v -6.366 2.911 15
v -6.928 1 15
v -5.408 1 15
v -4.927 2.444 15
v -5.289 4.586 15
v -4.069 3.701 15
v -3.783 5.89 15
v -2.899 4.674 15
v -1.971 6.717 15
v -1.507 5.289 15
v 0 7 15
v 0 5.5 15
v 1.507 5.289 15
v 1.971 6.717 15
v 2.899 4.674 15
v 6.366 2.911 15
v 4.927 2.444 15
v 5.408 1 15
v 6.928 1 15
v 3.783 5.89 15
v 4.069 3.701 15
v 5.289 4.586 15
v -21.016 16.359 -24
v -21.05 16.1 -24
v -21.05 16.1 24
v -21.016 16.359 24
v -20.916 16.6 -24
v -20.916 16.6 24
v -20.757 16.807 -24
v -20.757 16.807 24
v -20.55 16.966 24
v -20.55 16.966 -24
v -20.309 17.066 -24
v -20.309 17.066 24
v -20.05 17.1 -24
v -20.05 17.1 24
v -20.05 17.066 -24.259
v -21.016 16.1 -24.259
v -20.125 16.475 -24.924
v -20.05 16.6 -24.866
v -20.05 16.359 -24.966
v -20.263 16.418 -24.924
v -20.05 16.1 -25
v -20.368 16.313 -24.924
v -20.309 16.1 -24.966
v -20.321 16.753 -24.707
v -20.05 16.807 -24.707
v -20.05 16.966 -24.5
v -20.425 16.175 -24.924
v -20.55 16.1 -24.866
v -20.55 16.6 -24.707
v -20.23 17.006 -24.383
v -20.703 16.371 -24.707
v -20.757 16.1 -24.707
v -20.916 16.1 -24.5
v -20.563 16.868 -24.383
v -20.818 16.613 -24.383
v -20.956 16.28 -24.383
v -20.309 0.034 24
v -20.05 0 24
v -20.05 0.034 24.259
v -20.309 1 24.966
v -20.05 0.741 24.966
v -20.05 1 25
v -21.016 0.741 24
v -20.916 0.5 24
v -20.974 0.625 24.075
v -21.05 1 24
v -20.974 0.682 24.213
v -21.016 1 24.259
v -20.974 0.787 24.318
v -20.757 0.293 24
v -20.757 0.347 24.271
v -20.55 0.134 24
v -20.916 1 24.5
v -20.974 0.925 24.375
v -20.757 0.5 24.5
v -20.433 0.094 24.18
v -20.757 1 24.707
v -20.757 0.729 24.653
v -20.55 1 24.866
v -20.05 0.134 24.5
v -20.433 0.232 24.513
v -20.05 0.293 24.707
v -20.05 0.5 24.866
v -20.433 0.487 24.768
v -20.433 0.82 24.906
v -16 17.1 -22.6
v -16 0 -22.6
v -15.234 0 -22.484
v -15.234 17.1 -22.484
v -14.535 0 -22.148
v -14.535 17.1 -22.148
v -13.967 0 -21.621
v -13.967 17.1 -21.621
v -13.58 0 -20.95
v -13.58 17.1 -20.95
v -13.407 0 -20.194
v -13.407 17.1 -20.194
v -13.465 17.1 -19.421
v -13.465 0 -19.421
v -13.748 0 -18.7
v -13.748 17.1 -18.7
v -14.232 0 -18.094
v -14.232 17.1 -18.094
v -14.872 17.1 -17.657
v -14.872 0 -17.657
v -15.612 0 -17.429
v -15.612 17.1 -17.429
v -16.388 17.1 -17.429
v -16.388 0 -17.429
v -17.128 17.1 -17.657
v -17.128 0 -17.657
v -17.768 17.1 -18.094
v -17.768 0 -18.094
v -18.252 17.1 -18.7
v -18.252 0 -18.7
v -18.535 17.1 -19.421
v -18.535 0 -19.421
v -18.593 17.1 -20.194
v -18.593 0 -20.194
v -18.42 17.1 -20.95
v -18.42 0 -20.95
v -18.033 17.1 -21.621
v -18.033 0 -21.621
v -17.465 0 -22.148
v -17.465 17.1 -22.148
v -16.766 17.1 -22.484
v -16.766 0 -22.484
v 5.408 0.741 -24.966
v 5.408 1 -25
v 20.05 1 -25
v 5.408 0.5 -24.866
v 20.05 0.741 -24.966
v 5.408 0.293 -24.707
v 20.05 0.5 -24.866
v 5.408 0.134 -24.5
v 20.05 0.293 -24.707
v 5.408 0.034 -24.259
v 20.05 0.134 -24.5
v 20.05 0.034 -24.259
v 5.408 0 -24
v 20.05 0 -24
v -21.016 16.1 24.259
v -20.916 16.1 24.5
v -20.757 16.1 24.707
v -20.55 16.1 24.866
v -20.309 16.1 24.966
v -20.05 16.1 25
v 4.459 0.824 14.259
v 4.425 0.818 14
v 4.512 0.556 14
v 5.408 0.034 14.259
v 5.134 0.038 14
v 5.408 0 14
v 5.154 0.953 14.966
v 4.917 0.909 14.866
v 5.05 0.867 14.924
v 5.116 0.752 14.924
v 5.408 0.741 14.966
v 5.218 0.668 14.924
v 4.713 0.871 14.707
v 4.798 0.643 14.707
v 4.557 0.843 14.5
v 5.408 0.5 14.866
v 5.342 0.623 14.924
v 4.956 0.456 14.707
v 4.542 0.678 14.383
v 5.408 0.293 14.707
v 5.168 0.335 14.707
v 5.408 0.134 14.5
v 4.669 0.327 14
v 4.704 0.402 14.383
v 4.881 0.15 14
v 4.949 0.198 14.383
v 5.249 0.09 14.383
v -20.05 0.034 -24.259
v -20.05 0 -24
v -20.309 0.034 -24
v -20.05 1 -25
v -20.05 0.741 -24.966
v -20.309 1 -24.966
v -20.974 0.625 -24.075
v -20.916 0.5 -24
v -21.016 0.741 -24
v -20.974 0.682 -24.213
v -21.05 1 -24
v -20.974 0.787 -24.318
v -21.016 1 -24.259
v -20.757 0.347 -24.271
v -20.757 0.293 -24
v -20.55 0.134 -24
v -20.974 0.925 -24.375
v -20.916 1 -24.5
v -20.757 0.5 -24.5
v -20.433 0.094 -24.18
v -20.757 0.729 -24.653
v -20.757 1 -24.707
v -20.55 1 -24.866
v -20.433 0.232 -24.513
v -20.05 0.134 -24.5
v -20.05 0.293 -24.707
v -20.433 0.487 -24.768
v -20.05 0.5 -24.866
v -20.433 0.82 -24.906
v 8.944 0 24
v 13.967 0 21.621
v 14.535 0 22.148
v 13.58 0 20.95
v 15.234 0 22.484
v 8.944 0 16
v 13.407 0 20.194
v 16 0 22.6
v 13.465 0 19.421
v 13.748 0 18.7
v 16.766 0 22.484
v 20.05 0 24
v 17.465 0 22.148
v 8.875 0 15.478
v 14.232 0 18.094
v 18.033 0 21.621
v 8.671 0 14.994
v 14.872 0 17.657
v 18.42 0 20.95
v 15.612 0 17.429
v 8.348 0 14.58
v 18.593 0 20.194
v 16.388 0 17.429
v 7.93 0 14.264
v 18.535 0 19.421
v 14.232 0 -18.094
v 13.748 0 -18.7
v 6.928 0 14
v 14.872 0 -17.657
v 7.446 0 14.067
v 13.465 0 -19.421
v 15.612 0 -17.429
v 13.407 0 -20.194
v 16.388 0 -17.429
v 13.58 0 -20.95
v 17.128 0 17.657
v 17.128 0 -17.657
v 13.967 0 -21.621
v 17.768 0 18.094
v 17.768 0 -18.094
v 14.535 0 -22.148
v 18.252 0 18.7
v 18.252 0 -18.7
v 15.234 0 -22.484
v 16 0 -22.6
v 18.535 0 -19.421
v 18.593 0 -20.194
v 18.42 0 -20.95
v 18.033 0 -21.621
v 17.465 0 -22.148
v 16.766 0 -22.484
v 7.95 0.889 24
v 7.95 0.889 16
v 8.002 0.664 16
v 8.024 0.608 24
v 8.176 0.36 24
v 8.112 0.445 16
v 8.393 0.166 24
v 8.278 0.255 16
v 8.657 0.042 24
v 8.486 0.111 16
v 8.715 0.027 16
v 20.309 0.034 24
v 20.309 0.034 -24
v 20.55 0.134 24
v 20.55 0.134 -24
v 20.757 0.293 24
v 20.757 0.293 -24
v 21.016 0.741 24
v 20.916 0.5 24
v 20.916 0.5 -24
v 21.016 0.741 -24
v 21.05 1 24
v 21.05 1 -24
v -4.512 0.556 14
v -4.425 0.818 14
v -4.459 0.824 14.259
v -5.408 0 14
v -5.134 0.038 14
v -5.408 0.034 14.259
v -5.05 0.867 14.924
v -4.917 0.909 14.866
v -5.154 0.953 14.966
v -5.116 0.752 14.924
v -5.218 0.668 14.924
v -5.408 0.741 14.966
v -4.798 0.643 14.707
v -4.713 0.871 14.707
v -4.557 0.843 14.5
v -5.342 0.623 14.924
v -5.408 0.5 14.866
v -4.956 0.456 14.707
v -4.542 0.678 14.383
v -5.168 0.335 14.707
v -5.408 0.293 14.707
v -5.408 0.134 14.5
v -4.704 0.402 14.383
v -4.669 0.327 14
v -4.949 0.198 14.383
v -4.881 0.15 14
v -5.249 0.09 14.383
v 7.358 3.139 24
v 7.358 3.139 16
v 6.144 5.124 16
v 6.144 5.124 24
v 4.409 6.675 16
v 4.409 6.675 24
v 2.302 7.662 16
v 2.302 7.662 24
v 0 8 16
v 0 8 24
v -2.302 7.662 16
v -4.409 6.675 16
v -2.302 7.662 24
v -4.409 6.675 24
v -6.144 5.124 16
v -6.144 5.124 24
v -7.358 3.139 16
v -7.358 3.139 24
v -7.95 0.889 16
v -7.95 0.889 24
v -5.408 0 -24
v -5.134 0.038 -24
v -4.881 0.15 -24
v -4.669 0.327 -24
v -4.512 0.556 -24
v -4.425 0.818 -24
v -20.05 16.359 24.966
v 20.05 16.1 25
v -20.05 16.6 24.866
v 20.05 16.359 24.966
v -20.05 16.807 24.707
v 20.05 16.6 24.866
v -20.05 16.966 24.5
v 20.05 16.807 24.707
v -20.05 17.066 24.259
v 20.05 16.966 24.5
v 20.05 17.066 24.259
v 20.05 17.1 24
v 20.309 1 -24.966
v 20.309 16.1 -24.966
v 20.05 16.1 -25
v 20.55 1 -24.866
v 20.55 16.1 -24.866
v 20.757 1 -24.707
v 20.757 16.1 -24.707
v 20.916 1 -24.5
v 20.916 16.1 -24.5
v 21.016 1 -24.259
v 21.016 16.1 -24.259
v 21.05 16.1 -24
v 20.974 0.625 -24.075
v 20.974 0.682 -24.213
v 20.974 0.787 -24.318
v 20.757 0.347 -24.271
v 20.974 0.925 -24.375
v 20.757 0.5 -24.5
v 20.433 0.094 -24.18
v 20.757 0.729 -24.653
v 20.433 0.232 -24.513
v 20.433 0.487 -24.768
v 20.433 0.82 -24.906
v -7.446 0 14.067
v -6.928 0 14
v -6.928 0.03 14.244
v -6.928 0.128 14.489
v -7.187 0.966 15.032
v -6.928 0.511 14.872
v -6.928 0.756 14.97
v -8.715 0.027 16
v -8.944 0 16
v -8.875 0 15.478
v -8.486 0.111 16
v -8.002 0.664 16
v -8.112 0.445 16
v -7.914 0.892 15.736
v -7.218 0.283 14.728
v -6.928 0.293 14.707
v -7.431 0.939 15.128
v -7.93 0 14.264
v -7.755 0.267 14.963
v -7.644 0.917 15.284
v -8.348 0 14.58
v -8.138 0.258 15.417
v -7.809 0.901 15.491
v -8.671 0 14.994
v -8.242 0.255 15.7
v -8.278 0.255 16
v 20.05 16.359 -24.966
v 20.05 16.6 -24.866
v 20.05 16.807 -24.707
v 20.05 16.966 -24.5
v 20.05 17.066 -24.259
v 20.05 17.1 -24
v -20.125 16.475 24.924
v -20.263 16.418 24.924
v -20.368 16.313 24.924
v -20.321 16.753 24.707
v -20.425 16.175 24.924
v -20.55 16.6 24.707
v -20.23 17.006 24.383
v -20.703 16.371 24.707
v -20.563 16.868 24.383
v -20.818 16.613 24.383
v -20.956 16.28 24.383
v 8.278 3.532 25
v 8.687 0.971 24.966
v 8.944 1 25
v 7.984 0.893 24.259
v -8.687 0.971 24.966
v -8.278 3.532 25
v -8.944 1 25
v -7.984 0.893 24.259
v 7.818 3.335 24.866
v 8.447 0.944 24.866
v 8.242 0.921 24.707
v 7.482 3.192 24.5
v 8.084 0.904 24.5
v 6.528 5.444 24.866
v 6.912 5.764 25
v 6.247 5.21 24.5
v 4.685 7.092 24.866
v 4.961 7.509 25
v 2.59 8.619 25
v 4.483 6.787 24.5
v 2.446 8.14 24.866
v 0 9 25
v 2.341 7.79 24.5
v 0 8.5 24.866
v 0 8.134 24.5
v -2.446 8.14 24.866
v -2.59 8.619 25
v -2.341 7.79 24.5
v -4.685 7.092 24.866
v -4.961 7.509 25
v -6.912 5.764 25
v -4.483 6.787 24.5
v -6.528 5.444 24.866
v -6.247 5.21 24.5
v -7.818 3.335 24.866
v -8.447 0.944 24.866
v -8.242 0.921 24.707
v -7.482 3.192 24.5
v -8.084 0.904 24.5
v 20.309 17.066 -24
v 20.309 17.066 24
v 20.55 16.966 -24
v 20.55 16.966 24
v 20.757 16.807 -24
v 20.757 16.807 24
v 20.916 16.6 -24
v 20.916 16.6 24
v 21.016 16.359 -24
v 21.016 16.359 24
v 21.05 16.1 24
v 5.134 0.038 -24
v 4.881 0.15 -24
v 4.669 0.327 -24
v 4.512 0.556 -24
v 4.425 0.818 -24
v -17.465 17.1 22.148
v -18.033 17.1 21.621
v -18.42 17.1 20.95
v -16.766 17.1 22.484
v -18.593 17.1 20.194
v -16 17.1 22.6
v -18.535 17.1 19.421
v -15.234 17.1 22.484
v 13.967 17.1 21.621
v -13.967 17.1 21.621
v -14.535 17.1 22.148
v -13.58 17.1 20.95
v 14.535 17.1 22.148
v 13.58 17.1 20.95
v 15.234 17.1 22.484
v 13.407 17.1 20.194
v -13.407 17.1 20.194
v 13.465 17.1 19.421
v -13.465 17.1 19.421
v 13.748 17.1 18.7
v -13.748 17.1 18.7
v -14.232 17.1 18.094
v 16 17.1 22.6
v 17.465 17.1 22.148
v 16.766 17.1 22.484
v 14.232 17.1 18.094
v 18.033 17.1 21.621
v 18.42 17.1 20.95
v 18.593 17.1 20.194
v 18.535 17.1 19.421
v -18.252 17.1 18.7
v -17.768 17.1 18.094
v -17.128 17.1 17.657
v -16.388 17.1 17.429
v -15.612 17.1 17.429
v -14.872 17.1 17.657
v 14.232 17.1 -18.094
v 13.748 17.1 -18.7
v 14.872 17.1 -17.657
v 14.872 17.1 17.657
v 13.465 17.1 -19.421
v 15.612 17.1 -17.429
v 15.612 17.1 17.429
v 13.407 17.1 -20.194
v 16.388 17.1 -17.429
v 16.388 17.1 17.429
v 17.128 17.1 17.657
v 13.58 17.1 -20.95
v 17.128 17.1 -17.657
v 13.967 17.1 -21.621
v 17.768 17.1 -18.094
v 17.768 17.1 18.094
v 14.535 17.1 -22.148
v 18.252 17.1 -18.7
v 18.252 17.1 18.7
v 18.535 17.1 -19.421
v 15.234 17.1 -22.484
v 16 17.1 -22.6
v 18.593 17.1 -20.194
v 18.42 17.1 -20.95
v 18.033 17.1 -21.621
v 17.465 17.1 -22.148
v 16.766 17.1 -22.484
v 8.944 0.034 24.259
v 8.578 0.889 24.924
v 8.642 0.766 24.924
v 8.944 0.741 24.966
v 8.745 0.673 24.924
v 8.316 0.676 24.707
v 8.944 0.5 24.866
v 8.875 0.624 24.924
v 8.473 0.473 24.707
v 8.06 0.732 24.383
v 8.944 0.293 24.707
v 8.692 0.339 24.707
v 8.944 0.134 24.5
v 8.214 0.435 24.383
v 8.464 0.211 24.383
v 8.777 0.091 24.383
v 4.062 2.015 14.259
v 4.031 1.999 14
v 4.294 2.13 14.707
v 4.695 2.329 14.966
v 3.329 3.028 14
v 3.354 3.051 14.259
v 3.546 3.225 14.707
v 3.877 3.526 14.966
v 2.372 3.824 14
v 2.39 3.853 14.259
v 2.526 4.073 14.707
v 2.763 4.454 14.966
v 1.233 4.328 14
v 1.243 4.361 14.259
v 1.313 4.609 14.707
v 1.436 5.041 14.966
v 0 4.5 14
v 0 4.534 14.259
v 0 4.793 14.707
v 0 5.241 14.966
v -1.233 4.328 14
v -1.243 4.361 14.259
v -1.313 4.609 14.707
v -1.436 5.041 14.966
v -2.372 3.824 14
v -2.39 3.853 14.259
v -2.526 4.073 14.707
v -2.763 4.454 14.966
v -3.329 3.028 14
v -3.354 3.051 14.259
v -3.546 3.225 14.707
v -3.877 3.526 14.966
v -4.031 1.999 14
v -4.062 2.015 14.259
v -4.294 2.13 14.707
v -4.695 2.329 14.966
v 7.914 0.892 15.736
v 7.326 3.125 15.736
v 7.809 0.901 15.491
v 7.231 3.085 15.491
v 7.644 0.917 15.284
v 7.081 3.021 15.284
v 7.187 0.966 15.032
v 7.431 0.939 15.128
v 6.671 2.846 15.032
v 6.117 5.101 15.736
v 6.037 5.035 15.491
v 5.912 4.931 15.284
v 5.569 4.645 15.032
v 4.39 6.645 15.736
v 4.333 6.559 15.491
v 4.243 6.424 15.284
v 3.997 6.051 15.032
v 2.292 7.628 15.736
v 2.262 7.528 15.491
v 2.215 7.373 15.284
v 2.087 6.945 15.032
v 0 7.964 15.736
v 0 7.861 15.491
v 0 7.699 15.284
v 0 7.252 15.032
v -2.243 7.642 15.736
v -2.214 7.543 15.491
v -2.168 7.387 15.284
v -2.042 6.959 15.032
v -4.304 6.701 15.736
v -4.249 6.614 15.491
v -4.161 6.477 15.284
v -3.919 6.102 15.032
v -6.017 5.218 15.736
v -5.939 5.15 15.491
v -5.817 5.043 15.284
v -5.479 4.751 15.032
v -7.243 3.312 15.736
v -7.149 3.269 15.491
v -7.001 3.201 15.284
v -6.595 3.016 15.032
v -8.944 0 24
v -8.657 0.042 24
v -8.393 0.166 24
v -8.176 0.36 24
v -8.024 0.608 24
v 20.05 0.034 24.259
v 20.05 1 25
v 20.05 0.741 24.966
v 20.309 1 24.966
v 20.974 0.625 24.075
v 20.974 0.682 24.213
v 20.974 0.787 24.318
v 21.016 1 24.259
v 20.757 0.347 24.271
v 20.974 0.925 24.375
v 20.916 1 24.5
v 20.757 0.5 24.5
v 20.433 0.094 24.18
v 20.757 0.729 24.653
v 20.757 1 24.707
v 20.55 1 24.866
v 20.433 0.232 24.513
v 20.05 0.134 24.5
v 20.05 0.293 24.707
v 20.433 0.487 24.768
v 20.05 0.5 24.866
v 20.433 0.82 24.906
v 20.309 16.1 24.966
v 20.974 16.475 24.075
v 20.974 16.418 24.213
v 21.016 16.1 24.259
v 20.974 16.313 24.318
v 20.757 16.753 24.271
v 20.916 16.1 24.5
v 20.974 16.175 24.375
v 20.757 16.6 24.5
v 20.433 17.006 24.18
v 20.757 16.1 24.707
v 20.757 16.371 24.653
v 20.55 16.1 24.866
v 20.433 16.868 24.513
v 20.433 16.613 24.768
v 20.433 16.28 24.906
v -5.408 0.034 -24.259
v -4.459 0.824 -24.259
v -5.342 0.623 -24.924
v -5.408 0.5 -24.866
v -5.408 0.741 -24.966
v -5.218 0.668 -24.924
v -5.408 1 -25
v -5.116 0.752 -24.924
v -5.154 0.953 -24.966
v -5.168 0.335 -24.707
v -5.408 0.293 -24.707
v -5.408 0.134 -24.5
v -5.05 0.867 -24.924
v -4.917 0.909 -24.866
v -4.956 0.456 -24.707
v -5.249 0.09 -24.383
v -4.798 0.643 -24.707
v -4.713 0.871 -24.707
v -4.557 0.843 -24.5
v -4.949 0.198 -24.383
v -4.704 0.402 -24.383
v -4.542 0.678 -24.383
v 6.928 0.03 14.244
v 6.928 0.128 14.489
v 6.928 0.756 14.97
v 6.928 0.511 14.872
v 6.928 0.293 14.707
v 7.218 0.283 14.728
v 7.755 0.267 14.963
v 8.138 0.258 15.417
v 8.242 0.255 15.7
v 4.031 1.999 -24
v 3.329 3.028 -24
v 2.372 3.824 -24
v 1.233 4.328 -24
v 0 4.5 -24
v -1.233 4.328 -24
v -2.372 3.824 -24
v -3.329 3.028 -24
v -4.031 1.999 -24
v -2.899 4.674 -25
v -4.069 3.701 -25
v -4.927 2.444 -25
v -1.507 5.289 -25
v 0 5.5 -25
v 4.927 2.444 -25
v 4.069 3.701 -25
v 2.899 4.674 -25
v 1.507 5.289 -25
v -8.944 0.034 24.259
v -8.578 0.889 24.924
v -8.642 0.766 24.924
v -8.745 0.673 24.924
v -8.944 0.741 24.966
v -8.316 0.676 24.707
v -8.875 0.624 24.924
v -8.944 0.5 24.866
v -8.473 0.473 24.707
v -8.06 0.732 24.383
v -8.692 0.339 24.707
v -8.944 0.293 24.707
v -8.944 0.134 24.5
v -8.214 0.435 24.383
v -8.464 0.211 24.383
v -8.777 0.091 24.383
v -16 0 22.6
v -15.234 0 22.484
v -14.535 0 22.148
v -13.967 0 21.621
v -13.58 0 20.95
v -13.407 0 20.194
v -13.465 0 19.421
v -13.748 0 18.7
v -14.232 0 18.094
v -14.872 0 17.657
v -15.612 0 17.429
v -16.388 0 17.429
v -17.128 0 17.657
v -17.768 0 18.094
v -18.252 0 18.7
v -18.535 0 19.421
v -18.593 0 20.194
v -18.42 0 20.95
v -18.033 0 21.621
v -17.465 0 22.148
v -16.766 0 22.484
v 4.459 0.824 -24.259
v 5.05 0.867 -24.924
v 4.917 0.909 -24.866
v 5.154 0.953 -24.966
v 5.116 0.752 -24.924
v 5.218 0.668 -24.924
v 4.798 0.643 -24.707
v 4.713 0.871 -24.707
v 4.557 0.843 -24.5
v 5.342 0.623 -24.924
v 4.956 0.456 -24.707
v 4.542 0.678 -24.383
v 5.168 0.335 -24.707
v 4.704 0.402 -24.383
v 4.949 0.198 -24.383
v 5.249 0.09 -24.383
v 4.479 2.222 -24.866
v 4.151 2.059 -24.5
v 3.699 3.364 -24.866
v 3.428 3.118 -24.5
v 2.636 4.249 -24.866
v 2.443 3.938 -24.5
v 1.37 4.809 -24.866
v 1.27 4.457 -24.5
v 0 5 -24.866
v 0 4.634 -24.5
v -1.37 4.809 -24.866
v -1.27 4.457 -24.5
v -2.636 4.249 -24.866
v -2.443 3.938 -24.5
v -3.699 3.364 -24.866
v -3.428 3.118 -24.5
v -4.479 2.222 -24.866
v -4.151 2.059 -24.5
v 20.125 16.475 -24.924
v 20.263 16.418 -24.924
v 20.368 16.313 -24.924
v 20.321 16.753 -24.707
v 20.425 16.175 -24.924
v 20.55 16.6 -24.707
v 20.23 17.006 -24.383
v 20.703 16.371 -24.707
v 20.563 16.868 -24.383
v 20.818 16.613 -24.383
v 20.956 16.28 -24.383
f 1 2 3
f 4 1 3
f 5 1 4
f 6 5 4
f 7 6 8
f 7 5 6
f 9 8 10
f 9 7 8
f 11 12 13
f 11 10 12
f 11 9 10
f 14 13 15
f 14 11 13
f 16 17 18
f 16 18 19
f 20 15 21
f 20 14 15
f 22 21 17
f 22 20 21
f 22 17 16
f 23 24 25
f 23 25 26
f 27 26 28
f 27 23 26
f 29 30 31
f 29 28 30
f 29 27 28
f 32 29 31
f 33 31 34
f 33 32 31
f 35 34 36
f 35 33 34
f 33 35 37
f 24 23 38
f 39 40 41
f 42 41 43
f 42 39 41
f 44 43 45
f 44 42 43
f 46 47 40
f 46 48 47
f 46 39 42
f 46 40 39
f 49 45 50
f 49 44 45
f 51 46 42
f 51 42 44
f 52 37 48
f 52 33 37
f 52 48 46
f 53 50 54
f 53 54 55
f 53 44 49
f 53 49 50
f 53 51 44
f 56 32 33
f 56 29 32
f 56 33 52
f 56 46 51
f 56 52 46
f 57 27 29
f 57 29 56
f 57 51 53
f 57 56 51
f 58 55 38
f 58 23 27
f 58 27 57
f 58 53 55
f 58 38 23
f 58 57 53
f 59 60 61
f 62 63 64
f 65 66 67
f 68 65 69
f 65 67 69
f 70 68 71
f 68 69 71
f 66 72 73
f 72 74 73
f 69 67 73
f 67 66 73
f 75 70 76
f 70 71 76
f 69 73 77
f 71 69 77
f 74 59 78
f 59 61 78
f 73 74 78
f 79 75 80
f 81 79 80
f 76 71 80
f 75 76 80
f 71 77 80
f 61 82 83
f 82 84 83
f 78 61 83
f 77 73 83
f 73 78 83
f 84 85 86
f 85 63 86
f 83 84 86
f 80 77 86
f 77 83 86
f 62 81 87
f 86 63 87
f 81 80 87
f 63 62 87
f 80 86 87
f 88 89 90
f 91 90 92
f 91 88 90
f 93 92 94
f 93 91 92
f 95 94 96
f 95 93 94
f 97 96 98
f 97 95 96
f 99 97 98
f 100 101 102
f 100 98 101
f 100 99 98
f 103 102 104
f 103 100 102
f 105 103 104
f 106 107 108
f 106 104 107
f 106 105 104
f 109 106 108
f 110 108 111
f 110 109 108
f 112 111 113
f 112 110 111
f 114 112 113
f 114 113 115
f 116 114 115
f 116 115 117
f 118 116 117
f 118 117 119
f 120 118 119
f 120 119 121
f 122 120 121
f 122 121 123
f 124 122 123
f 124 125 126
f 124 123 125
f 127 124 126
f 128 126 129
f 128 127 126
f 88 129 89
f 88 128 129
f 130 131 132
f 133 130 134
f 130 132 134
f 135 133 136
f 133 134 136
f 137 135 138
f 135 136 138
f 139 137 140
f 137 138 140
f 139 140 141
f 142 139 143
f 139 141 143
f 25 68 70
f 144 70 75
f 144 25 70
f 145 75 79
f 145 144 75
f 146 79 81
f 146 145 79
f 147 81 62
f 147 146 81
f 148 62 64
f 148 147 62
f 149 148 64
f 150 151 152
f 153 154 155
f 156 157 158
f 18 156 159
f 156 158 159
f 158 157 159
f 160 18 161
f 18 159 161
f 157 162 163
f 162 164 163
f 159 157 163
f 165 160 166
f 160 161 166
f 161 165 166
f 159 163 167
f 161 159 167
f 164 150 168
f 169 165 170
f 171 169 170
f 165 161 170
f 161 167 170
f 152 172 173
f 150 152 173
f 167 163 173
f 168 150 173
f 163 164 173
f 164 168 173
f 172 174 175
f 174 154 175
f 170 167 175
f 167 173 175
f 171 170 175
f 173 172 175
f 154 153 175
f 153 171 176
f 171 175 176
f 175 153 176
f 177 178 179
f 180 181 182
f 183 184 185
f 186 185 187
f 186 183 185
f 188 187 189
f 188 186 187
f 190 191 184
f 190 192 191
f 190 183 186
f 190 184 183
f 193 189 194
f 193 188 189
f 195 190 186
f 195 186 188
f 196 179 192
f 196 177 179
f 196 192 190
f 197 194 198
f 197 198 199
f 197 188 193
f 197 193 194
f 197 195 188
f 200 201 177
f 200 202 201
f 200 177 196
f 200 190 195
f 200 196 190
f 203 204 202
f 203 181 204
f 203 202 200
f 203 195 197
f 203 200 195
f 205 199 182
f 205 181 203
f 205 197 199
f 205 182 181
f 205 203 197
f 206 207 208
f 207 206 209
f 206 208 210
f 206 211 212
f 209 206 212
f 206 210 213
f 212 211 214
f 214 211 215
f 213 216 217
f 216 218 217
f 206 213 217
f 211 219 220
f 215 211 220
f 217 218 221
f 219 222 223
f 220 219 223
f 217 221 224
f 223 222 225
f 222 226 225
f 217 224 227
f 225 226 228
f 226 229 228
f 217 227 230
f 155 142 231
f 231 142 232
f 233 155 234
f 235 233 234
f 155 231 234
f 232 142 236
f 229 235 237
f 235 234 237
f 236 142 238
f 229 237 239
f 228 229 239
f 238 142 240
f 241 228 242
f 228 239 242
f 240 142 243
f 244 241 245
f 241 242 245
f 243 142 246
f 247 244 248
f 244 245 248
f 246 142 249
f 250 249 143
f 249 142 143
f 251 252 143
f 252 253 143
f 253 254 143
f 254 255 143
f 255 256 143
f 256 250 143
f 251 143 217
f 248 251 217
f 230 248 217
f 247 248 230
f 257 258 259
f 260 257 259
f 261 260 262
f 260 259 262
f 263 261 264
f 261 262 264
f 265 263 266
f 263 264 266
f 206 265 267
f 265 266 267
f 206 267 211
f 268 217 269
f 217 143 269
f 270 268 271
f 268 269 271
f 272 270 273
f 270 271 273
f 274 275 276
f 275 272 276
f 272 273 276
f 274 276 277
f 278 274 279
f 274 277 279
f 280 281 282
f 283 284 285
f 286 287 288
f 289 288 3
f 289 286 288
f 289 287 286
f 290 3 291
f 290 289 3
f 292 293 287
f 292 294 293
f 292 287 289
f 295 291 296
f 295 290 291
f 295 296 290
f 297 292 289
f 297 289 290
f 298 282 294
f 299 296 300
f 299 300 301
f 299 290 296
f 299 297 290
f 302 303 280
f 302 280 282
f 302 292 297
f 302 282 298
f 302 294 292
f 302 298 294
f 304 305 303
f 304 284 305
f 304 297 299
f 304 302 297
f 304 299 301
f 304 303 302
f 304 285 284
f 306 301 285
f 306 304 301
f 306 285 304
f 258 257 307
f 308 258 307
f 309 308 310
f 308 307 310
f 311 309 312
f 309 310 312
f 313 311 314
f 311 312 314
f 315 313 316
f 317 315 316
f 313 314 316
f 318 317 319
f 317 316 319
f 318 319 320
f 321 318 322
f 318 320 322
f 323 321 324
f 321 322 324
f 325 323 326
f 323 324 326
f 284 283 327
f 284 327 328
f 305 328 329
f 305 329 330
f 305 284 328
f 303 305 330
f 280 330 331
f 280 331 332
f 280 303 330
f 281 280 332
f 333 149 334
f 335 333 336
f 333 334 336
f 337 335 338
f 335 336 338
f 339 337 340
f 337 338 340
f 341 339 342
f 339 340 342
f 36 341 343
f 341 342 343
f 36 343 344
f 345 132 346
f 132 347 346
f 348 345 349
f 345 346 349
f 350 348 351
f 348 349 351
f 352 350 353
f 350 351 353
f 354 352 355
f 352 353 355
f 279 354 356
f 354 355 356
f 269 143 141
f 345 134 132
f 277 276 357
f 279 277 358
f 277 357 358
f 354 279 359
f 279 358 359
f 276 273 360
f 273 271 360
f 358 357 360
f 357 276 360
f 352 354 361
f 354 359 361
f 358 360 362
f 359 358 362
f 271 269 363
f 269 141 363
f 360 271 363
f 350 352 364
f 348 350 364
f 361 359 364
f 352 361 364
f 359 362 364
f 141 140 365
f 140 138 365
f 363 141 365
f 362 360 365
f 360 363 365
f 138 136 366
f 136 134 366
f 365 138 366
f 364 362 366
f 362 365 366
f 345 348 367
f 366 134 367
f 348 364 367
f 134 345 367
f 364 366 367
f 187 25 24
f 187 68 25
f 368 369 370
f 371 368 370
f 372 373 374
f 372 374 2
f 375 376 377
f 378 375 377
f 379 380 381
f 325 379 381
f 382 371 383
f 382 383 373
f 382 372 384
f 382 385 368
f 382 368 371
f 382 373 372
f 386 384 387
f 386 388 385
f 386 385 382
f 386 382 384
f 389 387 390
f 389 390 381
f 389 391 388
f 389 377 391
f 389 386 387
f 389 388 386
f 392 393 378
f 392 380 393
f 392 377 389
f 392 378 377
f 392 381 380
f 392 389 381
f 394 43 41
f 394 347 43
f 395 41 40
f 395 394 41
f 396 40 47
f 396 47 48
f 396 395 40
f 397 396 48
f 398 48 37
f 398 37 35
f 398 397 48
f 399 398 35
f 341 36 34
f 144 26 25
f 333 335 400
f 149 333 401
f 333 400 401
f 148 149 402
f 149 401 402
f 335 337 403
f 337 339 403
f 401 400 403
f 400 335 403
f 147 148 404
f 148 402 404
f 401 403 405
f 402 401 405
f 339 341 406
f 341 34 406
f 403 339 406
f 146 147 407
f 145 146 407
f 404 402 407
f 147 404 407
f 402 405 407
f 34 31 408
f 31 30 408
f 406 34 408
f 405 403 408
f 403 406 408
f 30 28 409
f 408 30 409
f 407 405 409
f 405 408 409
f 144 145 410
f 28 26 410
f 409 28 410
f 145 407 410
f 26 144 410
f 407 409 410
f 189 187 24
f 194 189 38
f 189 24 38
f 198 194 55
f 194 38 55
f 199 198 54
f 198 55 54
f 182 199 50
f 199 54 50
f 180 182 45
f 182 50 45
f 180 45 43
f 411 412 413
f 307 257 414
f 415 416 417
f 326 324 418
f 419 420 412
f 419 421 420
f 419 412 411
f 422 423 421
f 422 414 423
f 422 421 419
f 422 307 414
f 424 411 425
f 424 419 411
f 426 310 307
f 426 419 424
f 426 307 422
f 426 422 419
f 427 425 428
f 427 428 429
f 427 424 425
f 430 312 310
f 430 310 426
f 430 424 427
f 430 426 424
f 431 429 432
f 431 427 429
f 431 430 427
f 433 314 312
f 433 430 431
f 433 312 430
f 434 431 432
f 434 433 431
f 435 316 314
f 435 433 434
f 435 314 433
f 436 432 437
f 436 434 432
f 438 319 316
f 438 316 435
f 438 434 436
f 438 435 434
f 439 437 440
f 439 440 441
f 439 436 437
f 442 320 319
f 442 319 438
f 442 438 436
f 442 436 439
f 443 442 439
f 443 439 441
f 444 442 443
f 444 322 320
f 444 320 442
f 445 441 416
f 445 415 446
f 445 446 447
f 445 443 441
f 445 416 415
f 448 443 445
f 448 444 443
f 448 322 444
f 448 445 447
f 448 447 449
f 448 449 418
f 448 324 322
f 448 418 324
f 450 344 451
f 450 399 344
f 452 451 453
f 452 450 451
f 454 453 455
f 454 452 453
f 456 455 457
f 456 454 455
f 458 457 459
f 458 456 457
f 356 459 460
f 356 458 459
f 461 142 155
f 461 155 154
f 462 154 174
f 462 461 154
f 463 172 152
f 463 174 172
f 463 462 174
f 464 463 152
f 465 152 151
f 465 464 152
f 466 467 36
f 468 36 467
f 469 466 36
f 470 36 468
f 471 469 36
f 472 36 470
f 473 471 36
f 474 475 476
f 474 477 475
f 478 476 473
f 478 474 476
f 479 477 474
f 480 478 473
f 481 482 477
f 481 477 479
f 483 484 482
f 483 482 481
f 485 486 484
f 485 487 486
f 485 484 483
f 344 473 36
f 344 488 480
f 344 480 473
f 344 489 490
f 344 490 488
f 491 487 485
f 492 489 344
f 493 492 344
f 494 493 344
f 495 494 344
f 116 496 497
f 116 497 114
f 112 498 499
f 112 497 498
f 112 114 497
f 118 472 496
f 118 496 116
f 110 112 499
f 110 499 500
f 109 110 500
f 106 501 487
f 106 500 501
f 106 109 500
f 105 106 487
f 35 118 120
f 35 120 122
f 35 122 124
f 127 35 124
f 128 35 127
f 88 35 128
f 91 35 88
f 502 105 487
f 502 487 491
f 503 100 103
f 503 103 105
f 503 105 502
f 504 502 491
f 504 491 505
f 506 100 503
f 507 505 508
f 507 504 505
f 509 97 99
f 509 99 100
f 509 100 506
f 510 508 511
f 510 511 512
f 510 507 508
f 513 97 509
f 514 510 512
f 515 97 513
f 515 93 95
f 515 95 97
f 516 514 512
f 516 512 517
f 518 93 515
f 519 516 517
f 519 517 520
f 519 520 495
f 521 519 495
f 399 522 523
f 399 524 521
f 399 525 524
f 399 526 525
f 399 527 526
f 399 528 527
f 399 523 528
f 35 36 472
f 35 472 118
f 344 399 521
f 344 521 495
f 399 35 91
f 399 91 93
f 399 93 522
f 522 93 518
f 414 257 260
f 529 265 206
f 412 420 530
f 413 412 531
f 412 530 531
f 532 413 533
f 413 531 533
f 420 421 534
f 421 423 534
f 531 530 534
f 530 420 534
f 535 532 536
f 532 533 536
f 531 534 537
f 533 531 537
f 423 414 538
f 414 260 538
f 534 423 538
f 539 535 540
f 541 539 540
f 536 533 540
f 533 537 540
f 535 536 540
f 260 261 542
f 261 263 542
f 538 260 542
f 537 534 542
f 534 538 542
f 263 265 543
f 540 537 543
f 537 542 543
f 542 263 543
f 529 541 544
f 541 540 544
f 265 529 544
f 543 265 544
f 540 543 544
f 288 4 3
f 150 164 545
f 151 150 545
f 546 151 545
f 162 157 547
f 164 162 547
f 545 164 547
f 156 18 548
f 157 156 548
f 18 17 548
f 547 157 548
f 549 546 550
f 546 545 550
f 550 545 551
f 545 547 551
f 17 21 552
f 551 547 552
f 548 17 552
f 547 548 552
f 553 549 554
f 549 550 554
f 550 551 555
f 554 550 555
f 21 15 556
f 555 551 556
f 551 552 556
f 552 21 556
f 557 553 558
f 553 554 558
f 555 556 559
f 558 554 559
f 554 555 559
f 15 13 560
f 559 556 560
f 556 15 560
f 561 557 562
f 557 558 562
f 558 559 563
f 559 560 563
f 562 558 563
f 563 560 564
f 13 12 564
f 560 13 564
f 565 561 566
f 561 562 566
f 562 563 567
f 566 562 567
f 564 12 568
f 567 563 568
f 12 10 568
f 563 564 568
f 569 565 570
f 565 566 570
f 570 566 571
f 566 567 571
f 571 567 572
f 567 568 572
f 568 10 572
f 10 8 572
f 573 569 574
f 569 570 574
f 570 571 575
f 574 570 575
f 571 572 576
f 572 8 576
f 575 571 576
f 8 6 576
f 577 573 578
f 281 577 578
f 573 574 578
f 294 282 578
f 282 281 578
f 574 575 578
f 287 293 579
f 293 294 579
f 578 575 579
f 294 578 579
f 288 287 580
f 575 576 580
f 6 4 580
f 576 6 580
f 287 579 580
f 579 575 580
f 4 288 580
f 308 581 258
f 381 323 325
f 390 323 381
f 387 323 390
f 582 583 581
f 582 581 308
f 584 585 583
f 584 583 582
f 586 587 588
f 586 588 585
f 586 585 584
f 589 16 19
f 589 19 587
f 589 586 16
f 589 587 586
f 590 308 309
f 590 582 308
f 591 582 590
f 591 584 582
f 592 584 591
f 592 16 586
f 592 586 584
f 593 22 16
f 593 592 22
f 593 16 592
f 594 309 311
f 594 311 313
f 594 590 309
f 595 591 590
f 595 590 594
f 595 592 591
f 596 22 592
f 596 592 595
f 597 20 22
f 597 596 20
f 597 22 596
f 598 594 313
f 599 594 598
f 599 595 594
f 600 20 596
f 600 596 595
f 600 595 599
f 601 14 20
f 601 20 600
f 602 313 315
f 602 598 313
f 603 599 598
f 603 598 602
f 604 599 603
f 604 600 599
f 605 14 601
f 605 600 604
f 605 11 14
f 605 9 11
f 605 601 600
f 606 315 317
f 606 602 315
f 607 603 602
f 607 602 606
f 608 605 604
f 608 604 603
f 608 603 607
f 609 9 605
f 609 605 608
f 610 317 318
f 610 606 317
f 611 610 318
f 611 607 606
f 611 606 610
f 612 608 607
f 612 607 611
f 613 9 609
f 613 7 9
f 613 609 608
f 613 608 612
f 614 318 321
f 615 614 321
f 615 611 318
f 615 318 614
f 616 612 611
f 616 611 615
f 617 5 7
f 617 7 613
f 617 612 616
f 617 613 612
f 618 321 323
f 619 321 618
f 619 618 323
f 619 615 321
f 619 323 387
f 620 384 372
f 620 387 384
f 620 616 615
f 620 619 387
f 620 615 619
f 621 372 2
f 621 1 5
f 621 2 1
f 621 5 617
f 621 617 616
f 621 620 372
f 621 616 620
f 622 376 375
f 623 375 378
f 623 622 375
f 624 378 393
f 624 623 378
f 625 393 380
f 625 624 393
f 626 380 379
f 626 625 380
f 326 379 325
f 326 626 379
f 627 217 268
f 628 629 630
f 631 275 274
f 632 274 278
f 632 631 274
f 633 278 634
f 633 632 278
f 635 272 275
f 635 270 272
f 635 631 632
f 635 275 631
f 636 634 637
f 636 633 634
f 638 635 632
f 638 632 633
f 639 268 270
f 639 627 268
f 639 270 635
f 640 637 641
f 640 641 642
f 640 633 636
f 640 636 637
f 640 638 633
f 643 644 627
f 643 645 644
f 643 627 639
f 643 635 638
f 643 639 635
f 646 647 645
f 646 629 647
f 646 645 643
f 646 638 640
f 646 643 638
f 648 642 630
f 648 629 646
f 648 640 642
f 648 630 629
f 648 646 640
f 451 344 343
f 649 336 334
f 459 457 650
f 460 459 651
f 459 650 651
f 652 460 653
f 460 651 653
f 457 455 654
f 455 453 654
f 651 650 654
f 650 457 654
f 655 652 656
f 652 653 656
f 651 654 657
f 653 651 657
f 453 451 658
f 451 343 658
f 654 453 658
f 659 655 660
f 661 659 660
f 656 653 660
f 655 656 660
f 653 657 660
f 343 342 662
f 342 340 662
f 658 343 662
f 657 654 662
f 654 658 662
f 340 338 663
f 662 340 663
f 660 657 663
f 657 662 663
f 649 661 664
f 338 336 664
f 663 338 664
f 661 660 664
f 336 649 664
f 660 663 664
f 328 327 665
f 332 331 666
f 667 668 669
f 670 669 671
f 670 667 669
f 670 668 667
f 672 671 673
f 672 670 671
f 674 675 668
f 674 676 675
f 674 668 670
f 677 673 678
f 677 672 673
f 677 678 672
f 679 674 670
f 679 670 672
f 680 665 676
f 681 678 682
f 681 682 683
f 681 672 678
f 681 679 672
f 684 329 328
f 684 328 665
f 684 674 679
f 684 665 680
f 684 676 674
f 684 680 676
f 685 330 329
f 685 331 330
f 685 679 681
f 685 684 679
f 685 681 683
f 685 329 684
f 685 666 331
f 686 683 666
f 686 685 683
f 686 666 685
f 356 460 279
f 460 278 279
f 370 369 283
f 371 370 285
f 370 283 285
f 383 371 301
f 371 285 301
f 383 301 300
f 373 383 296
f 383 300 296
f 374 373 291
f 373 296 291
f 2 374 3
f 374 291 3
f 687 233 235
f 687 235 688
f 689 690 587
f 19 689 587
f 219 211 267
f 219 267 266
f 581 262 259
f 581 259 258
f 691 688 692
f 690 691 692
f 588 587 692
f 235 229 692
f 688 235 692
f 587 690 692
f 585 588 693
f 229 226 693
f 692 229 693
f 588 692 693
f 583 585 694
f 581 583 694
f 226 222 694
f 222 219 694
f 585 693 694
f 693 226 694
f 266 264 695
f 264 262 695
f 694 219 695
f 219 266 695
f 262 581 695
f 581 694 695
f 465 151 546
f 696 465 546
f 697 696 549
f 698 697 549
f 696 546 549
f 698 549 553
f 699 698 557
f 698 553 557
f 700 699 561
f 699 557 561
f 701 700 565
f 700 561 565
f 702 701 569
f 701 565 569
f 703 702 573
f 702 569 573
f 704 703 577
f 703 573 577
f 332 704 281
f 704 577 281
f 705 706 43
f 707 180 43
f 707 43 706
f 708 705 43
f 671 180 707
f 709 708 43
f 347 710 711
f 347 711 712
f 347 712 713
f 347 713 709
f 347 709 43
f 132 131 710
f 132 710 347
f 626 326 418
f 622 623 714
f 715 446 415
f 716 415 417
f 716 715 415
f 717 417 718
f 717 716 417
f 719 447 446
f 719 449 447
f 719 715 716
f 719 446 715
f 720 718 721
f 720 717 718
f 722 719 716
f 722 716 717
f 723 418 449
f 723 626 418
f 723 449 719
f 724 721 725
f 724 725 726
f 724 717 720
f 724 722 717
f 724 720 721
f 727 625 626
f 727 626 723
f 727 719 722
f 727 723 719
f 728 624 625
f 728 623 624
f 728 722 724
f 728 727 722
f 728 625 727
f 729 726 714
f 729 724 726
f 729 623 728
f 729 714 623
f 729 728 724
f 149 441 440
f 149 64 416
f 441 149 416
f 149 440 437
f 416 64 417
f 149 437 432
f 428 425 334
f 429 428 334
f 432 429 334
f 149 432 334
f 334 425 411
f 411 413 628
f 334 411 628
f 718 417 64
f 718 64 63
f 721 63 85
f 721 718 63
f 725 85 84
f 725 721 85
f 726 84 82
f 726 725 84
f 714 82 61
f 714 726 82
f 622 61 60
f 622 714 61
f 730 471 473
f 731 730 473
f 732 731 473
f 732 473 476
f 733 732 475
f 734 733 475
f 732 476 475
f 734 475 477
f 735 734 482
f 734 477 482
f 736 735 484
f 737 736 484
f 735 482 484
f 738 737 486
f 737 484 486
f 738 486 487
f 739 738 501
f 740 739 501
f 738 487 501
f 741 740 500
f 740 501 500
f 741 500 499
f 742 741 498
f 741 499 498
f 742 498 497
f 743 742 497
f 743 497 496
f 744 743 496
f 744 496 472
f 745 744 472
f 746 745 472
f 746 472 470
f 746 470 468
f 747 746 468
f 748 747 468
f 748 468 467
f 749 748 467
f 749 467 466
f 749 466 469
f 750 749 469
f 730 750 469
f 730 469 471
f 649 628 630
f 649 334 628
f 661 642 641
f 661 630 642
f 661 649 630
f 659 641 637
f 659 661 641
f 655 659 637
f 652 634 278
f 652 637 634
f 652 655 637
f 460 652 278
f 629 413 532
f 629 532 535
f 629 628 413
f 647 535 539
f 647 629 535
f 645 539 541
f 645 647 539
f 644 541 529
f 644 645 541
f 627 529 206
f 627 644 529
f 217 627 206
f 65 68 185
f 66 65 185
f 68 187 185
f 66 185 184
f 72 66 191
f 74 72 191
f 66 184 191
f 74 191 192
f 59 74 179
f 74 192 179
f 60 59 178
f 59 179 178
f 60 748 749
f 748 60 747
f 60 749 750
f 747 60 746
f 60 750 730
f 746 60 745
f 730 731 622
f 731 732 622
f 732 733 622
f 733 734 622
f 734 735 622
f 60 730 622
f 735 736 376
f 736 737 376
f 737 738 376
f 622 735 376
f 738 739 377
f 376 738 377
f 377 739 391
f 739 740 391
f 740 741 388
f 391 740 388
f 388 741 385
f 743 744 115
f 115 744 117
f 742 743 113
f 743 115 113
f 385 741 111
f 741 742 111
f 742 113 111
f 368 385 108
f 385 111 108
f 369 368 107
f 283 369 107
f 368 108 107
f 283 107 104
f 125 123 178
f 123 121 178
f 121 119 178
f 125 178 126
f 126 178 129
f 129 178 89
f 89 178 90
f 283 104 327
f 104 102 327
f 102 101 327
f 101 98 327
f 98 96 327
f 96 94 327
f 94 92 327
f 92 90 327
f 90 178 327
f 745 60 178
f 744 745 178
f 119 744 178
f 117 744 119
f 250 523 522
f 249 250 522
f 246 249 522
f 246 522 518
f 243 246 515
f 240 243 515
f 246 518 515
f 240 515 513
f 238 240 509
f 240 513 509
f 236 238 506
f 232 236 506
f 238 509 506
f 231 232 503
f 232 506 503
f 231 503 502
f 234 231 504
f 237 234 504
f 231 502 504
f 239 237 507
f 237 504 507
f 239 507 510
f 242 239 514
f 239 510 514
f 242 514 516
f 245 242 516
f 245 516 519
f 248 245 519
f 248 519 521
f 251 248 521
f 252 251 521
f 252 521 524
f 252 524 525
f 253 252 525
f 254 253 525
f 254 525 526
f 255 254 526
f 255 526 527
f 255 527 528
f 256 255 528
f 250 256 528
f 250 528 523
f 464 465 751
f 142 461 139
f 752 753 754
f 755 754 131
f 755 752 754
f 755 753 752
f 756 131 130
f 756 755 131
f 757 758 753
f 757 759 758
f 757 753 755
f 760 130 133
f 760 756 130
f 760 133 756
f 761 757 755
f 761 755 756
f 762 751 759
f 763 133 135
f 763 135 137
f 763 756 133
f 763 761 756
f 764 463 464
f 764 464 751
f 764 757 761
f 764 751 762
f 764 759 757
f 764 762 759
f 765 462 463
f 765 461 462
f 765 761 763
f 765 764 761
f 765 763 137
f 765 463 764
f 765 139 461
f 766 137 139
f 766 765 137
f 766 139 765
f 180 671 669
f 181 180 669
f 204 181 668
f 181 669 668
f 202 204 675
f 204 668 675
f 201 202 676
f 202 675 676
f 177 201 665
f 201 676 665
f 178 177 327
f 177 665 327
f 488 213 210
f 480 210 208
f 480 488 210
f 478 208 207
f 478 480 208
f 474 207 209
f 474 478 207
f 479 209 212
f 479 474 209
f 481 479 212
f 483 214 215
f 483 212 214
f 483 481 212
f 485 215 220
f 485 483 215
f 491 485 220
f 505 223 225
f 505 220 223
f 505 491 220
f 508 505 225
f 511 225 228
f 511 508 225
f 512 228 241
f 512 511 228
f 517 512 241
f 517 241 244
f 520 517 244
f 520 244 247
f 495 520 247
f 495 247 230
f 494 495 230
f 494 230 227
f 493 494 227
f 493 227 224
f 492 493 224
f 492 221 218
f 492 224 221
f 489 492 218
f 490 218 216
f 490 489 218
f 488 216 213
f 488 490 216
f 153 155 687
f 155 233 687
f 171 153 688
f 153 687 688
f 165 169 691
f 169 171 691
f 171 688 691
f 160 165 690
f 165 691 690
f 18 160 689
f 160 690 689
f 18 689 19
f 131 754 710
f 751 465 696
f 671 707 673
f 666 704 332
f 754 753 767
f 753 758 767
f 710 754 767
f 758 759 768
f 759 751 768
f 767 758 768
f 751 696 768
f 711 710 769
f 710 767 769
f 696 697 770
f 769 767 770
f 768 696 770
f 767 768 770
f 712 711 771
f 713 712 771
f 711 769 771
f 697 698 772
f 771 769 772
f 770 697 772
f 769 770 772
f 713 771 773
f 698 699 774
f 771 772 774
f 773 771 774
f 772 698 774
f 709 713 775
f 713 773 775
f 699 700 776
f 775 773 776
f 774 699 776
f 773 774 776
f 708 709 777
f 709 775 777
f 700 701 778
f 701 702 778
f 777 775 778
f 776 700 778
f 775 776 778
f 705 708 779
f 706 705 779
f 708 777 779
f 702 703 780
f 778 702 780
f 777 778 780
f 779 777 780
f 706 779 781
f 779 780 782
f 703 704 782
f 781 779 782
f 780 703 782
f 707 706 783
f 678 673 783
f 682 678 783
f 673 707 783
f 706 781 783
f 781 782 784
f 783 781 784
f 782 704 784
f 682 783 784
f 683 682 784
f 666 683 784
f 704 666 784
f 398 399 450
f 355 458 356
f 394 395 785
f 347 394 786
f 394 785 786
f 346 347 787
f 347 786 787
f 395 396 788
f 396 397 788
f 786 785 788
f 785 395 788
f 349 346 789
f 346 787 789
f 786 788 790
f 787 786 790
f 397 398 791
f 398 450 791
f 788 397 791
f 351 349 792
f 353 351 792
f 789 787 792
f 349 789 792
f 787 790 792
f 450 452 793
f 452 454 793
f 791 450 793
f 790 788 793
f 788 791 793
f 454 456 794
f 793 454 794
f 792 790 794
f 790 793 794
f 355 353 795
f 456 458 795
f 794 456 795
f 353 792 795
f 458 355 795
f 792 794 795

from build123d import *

# Parameters (mm, degrees)
SKETCH1_W               = 42.1
SKETCH1_H               = 50
BOSS_EXTRUDE1_DEPTH     = 17.1
SKETCH2_R               = 2.6
CUT_EXTRUDE1_DEPTH      = 37.885125728
MIRROR3_COPY_1_SKETCH_R = 2.6
MIRROR3_COPY_1_DEPTH    = 37.885125728
SKETCH3_R               = 4.5
CUT_EXTRUDE2_DEPTH      = 57.881565555
SKETCH4_R               = 8
CUT_EXTRUDE3_DEPTH      = 10
FILLET1_R               = 1


with BuildPart() as part:
    # Sketch1 → Boss-Extrude1 (new body)
    with BuildSketch(Plane(origin=(0, 0, 0), x_dir=(1, 0, 0), z_dir=(0, 1, 0))):
        Rectangle(SKETCH1_W, SKETCH1_H)
    extrude(amount=BOSS_EXTRUDE1_DEPTH)

    # Sketch2 → Cut-Extrude1 (cut, through all)
    with BuildSketch(Plane(origin=(0, 17.1, 0), x_dir=(1, 0, 0), z_dir=(0, 1, 0))):
        with Locations(Location((-16, -20, 0), (0, 0, 270))):
            Circle(SKETCH2_R)
    cut_extrude1 = extrude(amount=-CUT_EXTRUDE1_DEPTH, mode=Mode.SUBTRACT)

    # Mirror2: Cut-Extrude1 across plane
    add(cut_extrude1.mirror(Plane.XY), mode=Mode.SUBTRACT)

    # Mirror3: Cut-Extrude1 across plane
    add(cut_extrude1.mirror(Plane(origin=(0, 0, 0), x_dir=(0, 0, 1), z_dir=(1, 0, 0))), mode=Mode.SUBTRACT)

    # Mirror3 copy 1 sketch → Mirror3 copy 1 (cut, through all)
    with BuildSketch(Plane(origin=(0, 17.1, 0), x_dir=(-1, 0, 0), z_dir=(0, 1, 0))):
        with Locations(Location((-16, -20, 0), (0, 0, 270))):
            Circle(MIRROR3_COPY_1_SKETCH_R)
    extrude(amount=-MIRROR3_COPY_1_DEPTH, mode=Mode.SUBTRACT)

    # Sketch3 → Cut-Extrude2 (cut, through all)
    with BuildSketch(Plane.XY.offset(25)):
        Circle(SKETCH3_R)
    extrude(amount=-CUT_EXTRUDE2_DEPTH, mode=Mode.SUBTRACT)

    # Sketch4 → Cut-Extrude3 (cut)
    with BuildSketch(Plane.XY.offset(25)):
        Circle(SKETCH4_R)
    extrude(amount=-CUT_EXTRUDE3_DEPTH, mode=Mode.SUBTRACT)

    # Fillet1
    fillet1_edges = [part.edges().sort_by_distance(p)[0] for p in [
        (-21.05, 17.1, 0),
        (0, 17.1, 25),
        (-12.775, 0, -25),
        (4.5, 0, -5),
        (0, 4.5, -25),
        (21.05, 17.1, 0),
        (-4.5, 0, -5),
        (0, 4.5, 15),
        (14.525, 0, 25),
        (-14.525, 0, 25),
        (8, 0, 20),
        (-8, 0, 20),
        (0, 8, 15),
        (6.25, 0, 15),
        (-6.25, 0, 15),
        (0, 8, 25),
        (-21.05, 0, 0),
        (12.775, 0, -25),
        (21.05, 0, 0),
        (0, 17.1, -25),
        (21.05, 8.55, 25),
        (-21.05, 8.55, 25),
        (-21.05, 8.55, -25),
        (21.05, 8.55, -25),
    ]]
    fillet(fillet1_edges, radius=FILLET1_R)


solid = part.part
